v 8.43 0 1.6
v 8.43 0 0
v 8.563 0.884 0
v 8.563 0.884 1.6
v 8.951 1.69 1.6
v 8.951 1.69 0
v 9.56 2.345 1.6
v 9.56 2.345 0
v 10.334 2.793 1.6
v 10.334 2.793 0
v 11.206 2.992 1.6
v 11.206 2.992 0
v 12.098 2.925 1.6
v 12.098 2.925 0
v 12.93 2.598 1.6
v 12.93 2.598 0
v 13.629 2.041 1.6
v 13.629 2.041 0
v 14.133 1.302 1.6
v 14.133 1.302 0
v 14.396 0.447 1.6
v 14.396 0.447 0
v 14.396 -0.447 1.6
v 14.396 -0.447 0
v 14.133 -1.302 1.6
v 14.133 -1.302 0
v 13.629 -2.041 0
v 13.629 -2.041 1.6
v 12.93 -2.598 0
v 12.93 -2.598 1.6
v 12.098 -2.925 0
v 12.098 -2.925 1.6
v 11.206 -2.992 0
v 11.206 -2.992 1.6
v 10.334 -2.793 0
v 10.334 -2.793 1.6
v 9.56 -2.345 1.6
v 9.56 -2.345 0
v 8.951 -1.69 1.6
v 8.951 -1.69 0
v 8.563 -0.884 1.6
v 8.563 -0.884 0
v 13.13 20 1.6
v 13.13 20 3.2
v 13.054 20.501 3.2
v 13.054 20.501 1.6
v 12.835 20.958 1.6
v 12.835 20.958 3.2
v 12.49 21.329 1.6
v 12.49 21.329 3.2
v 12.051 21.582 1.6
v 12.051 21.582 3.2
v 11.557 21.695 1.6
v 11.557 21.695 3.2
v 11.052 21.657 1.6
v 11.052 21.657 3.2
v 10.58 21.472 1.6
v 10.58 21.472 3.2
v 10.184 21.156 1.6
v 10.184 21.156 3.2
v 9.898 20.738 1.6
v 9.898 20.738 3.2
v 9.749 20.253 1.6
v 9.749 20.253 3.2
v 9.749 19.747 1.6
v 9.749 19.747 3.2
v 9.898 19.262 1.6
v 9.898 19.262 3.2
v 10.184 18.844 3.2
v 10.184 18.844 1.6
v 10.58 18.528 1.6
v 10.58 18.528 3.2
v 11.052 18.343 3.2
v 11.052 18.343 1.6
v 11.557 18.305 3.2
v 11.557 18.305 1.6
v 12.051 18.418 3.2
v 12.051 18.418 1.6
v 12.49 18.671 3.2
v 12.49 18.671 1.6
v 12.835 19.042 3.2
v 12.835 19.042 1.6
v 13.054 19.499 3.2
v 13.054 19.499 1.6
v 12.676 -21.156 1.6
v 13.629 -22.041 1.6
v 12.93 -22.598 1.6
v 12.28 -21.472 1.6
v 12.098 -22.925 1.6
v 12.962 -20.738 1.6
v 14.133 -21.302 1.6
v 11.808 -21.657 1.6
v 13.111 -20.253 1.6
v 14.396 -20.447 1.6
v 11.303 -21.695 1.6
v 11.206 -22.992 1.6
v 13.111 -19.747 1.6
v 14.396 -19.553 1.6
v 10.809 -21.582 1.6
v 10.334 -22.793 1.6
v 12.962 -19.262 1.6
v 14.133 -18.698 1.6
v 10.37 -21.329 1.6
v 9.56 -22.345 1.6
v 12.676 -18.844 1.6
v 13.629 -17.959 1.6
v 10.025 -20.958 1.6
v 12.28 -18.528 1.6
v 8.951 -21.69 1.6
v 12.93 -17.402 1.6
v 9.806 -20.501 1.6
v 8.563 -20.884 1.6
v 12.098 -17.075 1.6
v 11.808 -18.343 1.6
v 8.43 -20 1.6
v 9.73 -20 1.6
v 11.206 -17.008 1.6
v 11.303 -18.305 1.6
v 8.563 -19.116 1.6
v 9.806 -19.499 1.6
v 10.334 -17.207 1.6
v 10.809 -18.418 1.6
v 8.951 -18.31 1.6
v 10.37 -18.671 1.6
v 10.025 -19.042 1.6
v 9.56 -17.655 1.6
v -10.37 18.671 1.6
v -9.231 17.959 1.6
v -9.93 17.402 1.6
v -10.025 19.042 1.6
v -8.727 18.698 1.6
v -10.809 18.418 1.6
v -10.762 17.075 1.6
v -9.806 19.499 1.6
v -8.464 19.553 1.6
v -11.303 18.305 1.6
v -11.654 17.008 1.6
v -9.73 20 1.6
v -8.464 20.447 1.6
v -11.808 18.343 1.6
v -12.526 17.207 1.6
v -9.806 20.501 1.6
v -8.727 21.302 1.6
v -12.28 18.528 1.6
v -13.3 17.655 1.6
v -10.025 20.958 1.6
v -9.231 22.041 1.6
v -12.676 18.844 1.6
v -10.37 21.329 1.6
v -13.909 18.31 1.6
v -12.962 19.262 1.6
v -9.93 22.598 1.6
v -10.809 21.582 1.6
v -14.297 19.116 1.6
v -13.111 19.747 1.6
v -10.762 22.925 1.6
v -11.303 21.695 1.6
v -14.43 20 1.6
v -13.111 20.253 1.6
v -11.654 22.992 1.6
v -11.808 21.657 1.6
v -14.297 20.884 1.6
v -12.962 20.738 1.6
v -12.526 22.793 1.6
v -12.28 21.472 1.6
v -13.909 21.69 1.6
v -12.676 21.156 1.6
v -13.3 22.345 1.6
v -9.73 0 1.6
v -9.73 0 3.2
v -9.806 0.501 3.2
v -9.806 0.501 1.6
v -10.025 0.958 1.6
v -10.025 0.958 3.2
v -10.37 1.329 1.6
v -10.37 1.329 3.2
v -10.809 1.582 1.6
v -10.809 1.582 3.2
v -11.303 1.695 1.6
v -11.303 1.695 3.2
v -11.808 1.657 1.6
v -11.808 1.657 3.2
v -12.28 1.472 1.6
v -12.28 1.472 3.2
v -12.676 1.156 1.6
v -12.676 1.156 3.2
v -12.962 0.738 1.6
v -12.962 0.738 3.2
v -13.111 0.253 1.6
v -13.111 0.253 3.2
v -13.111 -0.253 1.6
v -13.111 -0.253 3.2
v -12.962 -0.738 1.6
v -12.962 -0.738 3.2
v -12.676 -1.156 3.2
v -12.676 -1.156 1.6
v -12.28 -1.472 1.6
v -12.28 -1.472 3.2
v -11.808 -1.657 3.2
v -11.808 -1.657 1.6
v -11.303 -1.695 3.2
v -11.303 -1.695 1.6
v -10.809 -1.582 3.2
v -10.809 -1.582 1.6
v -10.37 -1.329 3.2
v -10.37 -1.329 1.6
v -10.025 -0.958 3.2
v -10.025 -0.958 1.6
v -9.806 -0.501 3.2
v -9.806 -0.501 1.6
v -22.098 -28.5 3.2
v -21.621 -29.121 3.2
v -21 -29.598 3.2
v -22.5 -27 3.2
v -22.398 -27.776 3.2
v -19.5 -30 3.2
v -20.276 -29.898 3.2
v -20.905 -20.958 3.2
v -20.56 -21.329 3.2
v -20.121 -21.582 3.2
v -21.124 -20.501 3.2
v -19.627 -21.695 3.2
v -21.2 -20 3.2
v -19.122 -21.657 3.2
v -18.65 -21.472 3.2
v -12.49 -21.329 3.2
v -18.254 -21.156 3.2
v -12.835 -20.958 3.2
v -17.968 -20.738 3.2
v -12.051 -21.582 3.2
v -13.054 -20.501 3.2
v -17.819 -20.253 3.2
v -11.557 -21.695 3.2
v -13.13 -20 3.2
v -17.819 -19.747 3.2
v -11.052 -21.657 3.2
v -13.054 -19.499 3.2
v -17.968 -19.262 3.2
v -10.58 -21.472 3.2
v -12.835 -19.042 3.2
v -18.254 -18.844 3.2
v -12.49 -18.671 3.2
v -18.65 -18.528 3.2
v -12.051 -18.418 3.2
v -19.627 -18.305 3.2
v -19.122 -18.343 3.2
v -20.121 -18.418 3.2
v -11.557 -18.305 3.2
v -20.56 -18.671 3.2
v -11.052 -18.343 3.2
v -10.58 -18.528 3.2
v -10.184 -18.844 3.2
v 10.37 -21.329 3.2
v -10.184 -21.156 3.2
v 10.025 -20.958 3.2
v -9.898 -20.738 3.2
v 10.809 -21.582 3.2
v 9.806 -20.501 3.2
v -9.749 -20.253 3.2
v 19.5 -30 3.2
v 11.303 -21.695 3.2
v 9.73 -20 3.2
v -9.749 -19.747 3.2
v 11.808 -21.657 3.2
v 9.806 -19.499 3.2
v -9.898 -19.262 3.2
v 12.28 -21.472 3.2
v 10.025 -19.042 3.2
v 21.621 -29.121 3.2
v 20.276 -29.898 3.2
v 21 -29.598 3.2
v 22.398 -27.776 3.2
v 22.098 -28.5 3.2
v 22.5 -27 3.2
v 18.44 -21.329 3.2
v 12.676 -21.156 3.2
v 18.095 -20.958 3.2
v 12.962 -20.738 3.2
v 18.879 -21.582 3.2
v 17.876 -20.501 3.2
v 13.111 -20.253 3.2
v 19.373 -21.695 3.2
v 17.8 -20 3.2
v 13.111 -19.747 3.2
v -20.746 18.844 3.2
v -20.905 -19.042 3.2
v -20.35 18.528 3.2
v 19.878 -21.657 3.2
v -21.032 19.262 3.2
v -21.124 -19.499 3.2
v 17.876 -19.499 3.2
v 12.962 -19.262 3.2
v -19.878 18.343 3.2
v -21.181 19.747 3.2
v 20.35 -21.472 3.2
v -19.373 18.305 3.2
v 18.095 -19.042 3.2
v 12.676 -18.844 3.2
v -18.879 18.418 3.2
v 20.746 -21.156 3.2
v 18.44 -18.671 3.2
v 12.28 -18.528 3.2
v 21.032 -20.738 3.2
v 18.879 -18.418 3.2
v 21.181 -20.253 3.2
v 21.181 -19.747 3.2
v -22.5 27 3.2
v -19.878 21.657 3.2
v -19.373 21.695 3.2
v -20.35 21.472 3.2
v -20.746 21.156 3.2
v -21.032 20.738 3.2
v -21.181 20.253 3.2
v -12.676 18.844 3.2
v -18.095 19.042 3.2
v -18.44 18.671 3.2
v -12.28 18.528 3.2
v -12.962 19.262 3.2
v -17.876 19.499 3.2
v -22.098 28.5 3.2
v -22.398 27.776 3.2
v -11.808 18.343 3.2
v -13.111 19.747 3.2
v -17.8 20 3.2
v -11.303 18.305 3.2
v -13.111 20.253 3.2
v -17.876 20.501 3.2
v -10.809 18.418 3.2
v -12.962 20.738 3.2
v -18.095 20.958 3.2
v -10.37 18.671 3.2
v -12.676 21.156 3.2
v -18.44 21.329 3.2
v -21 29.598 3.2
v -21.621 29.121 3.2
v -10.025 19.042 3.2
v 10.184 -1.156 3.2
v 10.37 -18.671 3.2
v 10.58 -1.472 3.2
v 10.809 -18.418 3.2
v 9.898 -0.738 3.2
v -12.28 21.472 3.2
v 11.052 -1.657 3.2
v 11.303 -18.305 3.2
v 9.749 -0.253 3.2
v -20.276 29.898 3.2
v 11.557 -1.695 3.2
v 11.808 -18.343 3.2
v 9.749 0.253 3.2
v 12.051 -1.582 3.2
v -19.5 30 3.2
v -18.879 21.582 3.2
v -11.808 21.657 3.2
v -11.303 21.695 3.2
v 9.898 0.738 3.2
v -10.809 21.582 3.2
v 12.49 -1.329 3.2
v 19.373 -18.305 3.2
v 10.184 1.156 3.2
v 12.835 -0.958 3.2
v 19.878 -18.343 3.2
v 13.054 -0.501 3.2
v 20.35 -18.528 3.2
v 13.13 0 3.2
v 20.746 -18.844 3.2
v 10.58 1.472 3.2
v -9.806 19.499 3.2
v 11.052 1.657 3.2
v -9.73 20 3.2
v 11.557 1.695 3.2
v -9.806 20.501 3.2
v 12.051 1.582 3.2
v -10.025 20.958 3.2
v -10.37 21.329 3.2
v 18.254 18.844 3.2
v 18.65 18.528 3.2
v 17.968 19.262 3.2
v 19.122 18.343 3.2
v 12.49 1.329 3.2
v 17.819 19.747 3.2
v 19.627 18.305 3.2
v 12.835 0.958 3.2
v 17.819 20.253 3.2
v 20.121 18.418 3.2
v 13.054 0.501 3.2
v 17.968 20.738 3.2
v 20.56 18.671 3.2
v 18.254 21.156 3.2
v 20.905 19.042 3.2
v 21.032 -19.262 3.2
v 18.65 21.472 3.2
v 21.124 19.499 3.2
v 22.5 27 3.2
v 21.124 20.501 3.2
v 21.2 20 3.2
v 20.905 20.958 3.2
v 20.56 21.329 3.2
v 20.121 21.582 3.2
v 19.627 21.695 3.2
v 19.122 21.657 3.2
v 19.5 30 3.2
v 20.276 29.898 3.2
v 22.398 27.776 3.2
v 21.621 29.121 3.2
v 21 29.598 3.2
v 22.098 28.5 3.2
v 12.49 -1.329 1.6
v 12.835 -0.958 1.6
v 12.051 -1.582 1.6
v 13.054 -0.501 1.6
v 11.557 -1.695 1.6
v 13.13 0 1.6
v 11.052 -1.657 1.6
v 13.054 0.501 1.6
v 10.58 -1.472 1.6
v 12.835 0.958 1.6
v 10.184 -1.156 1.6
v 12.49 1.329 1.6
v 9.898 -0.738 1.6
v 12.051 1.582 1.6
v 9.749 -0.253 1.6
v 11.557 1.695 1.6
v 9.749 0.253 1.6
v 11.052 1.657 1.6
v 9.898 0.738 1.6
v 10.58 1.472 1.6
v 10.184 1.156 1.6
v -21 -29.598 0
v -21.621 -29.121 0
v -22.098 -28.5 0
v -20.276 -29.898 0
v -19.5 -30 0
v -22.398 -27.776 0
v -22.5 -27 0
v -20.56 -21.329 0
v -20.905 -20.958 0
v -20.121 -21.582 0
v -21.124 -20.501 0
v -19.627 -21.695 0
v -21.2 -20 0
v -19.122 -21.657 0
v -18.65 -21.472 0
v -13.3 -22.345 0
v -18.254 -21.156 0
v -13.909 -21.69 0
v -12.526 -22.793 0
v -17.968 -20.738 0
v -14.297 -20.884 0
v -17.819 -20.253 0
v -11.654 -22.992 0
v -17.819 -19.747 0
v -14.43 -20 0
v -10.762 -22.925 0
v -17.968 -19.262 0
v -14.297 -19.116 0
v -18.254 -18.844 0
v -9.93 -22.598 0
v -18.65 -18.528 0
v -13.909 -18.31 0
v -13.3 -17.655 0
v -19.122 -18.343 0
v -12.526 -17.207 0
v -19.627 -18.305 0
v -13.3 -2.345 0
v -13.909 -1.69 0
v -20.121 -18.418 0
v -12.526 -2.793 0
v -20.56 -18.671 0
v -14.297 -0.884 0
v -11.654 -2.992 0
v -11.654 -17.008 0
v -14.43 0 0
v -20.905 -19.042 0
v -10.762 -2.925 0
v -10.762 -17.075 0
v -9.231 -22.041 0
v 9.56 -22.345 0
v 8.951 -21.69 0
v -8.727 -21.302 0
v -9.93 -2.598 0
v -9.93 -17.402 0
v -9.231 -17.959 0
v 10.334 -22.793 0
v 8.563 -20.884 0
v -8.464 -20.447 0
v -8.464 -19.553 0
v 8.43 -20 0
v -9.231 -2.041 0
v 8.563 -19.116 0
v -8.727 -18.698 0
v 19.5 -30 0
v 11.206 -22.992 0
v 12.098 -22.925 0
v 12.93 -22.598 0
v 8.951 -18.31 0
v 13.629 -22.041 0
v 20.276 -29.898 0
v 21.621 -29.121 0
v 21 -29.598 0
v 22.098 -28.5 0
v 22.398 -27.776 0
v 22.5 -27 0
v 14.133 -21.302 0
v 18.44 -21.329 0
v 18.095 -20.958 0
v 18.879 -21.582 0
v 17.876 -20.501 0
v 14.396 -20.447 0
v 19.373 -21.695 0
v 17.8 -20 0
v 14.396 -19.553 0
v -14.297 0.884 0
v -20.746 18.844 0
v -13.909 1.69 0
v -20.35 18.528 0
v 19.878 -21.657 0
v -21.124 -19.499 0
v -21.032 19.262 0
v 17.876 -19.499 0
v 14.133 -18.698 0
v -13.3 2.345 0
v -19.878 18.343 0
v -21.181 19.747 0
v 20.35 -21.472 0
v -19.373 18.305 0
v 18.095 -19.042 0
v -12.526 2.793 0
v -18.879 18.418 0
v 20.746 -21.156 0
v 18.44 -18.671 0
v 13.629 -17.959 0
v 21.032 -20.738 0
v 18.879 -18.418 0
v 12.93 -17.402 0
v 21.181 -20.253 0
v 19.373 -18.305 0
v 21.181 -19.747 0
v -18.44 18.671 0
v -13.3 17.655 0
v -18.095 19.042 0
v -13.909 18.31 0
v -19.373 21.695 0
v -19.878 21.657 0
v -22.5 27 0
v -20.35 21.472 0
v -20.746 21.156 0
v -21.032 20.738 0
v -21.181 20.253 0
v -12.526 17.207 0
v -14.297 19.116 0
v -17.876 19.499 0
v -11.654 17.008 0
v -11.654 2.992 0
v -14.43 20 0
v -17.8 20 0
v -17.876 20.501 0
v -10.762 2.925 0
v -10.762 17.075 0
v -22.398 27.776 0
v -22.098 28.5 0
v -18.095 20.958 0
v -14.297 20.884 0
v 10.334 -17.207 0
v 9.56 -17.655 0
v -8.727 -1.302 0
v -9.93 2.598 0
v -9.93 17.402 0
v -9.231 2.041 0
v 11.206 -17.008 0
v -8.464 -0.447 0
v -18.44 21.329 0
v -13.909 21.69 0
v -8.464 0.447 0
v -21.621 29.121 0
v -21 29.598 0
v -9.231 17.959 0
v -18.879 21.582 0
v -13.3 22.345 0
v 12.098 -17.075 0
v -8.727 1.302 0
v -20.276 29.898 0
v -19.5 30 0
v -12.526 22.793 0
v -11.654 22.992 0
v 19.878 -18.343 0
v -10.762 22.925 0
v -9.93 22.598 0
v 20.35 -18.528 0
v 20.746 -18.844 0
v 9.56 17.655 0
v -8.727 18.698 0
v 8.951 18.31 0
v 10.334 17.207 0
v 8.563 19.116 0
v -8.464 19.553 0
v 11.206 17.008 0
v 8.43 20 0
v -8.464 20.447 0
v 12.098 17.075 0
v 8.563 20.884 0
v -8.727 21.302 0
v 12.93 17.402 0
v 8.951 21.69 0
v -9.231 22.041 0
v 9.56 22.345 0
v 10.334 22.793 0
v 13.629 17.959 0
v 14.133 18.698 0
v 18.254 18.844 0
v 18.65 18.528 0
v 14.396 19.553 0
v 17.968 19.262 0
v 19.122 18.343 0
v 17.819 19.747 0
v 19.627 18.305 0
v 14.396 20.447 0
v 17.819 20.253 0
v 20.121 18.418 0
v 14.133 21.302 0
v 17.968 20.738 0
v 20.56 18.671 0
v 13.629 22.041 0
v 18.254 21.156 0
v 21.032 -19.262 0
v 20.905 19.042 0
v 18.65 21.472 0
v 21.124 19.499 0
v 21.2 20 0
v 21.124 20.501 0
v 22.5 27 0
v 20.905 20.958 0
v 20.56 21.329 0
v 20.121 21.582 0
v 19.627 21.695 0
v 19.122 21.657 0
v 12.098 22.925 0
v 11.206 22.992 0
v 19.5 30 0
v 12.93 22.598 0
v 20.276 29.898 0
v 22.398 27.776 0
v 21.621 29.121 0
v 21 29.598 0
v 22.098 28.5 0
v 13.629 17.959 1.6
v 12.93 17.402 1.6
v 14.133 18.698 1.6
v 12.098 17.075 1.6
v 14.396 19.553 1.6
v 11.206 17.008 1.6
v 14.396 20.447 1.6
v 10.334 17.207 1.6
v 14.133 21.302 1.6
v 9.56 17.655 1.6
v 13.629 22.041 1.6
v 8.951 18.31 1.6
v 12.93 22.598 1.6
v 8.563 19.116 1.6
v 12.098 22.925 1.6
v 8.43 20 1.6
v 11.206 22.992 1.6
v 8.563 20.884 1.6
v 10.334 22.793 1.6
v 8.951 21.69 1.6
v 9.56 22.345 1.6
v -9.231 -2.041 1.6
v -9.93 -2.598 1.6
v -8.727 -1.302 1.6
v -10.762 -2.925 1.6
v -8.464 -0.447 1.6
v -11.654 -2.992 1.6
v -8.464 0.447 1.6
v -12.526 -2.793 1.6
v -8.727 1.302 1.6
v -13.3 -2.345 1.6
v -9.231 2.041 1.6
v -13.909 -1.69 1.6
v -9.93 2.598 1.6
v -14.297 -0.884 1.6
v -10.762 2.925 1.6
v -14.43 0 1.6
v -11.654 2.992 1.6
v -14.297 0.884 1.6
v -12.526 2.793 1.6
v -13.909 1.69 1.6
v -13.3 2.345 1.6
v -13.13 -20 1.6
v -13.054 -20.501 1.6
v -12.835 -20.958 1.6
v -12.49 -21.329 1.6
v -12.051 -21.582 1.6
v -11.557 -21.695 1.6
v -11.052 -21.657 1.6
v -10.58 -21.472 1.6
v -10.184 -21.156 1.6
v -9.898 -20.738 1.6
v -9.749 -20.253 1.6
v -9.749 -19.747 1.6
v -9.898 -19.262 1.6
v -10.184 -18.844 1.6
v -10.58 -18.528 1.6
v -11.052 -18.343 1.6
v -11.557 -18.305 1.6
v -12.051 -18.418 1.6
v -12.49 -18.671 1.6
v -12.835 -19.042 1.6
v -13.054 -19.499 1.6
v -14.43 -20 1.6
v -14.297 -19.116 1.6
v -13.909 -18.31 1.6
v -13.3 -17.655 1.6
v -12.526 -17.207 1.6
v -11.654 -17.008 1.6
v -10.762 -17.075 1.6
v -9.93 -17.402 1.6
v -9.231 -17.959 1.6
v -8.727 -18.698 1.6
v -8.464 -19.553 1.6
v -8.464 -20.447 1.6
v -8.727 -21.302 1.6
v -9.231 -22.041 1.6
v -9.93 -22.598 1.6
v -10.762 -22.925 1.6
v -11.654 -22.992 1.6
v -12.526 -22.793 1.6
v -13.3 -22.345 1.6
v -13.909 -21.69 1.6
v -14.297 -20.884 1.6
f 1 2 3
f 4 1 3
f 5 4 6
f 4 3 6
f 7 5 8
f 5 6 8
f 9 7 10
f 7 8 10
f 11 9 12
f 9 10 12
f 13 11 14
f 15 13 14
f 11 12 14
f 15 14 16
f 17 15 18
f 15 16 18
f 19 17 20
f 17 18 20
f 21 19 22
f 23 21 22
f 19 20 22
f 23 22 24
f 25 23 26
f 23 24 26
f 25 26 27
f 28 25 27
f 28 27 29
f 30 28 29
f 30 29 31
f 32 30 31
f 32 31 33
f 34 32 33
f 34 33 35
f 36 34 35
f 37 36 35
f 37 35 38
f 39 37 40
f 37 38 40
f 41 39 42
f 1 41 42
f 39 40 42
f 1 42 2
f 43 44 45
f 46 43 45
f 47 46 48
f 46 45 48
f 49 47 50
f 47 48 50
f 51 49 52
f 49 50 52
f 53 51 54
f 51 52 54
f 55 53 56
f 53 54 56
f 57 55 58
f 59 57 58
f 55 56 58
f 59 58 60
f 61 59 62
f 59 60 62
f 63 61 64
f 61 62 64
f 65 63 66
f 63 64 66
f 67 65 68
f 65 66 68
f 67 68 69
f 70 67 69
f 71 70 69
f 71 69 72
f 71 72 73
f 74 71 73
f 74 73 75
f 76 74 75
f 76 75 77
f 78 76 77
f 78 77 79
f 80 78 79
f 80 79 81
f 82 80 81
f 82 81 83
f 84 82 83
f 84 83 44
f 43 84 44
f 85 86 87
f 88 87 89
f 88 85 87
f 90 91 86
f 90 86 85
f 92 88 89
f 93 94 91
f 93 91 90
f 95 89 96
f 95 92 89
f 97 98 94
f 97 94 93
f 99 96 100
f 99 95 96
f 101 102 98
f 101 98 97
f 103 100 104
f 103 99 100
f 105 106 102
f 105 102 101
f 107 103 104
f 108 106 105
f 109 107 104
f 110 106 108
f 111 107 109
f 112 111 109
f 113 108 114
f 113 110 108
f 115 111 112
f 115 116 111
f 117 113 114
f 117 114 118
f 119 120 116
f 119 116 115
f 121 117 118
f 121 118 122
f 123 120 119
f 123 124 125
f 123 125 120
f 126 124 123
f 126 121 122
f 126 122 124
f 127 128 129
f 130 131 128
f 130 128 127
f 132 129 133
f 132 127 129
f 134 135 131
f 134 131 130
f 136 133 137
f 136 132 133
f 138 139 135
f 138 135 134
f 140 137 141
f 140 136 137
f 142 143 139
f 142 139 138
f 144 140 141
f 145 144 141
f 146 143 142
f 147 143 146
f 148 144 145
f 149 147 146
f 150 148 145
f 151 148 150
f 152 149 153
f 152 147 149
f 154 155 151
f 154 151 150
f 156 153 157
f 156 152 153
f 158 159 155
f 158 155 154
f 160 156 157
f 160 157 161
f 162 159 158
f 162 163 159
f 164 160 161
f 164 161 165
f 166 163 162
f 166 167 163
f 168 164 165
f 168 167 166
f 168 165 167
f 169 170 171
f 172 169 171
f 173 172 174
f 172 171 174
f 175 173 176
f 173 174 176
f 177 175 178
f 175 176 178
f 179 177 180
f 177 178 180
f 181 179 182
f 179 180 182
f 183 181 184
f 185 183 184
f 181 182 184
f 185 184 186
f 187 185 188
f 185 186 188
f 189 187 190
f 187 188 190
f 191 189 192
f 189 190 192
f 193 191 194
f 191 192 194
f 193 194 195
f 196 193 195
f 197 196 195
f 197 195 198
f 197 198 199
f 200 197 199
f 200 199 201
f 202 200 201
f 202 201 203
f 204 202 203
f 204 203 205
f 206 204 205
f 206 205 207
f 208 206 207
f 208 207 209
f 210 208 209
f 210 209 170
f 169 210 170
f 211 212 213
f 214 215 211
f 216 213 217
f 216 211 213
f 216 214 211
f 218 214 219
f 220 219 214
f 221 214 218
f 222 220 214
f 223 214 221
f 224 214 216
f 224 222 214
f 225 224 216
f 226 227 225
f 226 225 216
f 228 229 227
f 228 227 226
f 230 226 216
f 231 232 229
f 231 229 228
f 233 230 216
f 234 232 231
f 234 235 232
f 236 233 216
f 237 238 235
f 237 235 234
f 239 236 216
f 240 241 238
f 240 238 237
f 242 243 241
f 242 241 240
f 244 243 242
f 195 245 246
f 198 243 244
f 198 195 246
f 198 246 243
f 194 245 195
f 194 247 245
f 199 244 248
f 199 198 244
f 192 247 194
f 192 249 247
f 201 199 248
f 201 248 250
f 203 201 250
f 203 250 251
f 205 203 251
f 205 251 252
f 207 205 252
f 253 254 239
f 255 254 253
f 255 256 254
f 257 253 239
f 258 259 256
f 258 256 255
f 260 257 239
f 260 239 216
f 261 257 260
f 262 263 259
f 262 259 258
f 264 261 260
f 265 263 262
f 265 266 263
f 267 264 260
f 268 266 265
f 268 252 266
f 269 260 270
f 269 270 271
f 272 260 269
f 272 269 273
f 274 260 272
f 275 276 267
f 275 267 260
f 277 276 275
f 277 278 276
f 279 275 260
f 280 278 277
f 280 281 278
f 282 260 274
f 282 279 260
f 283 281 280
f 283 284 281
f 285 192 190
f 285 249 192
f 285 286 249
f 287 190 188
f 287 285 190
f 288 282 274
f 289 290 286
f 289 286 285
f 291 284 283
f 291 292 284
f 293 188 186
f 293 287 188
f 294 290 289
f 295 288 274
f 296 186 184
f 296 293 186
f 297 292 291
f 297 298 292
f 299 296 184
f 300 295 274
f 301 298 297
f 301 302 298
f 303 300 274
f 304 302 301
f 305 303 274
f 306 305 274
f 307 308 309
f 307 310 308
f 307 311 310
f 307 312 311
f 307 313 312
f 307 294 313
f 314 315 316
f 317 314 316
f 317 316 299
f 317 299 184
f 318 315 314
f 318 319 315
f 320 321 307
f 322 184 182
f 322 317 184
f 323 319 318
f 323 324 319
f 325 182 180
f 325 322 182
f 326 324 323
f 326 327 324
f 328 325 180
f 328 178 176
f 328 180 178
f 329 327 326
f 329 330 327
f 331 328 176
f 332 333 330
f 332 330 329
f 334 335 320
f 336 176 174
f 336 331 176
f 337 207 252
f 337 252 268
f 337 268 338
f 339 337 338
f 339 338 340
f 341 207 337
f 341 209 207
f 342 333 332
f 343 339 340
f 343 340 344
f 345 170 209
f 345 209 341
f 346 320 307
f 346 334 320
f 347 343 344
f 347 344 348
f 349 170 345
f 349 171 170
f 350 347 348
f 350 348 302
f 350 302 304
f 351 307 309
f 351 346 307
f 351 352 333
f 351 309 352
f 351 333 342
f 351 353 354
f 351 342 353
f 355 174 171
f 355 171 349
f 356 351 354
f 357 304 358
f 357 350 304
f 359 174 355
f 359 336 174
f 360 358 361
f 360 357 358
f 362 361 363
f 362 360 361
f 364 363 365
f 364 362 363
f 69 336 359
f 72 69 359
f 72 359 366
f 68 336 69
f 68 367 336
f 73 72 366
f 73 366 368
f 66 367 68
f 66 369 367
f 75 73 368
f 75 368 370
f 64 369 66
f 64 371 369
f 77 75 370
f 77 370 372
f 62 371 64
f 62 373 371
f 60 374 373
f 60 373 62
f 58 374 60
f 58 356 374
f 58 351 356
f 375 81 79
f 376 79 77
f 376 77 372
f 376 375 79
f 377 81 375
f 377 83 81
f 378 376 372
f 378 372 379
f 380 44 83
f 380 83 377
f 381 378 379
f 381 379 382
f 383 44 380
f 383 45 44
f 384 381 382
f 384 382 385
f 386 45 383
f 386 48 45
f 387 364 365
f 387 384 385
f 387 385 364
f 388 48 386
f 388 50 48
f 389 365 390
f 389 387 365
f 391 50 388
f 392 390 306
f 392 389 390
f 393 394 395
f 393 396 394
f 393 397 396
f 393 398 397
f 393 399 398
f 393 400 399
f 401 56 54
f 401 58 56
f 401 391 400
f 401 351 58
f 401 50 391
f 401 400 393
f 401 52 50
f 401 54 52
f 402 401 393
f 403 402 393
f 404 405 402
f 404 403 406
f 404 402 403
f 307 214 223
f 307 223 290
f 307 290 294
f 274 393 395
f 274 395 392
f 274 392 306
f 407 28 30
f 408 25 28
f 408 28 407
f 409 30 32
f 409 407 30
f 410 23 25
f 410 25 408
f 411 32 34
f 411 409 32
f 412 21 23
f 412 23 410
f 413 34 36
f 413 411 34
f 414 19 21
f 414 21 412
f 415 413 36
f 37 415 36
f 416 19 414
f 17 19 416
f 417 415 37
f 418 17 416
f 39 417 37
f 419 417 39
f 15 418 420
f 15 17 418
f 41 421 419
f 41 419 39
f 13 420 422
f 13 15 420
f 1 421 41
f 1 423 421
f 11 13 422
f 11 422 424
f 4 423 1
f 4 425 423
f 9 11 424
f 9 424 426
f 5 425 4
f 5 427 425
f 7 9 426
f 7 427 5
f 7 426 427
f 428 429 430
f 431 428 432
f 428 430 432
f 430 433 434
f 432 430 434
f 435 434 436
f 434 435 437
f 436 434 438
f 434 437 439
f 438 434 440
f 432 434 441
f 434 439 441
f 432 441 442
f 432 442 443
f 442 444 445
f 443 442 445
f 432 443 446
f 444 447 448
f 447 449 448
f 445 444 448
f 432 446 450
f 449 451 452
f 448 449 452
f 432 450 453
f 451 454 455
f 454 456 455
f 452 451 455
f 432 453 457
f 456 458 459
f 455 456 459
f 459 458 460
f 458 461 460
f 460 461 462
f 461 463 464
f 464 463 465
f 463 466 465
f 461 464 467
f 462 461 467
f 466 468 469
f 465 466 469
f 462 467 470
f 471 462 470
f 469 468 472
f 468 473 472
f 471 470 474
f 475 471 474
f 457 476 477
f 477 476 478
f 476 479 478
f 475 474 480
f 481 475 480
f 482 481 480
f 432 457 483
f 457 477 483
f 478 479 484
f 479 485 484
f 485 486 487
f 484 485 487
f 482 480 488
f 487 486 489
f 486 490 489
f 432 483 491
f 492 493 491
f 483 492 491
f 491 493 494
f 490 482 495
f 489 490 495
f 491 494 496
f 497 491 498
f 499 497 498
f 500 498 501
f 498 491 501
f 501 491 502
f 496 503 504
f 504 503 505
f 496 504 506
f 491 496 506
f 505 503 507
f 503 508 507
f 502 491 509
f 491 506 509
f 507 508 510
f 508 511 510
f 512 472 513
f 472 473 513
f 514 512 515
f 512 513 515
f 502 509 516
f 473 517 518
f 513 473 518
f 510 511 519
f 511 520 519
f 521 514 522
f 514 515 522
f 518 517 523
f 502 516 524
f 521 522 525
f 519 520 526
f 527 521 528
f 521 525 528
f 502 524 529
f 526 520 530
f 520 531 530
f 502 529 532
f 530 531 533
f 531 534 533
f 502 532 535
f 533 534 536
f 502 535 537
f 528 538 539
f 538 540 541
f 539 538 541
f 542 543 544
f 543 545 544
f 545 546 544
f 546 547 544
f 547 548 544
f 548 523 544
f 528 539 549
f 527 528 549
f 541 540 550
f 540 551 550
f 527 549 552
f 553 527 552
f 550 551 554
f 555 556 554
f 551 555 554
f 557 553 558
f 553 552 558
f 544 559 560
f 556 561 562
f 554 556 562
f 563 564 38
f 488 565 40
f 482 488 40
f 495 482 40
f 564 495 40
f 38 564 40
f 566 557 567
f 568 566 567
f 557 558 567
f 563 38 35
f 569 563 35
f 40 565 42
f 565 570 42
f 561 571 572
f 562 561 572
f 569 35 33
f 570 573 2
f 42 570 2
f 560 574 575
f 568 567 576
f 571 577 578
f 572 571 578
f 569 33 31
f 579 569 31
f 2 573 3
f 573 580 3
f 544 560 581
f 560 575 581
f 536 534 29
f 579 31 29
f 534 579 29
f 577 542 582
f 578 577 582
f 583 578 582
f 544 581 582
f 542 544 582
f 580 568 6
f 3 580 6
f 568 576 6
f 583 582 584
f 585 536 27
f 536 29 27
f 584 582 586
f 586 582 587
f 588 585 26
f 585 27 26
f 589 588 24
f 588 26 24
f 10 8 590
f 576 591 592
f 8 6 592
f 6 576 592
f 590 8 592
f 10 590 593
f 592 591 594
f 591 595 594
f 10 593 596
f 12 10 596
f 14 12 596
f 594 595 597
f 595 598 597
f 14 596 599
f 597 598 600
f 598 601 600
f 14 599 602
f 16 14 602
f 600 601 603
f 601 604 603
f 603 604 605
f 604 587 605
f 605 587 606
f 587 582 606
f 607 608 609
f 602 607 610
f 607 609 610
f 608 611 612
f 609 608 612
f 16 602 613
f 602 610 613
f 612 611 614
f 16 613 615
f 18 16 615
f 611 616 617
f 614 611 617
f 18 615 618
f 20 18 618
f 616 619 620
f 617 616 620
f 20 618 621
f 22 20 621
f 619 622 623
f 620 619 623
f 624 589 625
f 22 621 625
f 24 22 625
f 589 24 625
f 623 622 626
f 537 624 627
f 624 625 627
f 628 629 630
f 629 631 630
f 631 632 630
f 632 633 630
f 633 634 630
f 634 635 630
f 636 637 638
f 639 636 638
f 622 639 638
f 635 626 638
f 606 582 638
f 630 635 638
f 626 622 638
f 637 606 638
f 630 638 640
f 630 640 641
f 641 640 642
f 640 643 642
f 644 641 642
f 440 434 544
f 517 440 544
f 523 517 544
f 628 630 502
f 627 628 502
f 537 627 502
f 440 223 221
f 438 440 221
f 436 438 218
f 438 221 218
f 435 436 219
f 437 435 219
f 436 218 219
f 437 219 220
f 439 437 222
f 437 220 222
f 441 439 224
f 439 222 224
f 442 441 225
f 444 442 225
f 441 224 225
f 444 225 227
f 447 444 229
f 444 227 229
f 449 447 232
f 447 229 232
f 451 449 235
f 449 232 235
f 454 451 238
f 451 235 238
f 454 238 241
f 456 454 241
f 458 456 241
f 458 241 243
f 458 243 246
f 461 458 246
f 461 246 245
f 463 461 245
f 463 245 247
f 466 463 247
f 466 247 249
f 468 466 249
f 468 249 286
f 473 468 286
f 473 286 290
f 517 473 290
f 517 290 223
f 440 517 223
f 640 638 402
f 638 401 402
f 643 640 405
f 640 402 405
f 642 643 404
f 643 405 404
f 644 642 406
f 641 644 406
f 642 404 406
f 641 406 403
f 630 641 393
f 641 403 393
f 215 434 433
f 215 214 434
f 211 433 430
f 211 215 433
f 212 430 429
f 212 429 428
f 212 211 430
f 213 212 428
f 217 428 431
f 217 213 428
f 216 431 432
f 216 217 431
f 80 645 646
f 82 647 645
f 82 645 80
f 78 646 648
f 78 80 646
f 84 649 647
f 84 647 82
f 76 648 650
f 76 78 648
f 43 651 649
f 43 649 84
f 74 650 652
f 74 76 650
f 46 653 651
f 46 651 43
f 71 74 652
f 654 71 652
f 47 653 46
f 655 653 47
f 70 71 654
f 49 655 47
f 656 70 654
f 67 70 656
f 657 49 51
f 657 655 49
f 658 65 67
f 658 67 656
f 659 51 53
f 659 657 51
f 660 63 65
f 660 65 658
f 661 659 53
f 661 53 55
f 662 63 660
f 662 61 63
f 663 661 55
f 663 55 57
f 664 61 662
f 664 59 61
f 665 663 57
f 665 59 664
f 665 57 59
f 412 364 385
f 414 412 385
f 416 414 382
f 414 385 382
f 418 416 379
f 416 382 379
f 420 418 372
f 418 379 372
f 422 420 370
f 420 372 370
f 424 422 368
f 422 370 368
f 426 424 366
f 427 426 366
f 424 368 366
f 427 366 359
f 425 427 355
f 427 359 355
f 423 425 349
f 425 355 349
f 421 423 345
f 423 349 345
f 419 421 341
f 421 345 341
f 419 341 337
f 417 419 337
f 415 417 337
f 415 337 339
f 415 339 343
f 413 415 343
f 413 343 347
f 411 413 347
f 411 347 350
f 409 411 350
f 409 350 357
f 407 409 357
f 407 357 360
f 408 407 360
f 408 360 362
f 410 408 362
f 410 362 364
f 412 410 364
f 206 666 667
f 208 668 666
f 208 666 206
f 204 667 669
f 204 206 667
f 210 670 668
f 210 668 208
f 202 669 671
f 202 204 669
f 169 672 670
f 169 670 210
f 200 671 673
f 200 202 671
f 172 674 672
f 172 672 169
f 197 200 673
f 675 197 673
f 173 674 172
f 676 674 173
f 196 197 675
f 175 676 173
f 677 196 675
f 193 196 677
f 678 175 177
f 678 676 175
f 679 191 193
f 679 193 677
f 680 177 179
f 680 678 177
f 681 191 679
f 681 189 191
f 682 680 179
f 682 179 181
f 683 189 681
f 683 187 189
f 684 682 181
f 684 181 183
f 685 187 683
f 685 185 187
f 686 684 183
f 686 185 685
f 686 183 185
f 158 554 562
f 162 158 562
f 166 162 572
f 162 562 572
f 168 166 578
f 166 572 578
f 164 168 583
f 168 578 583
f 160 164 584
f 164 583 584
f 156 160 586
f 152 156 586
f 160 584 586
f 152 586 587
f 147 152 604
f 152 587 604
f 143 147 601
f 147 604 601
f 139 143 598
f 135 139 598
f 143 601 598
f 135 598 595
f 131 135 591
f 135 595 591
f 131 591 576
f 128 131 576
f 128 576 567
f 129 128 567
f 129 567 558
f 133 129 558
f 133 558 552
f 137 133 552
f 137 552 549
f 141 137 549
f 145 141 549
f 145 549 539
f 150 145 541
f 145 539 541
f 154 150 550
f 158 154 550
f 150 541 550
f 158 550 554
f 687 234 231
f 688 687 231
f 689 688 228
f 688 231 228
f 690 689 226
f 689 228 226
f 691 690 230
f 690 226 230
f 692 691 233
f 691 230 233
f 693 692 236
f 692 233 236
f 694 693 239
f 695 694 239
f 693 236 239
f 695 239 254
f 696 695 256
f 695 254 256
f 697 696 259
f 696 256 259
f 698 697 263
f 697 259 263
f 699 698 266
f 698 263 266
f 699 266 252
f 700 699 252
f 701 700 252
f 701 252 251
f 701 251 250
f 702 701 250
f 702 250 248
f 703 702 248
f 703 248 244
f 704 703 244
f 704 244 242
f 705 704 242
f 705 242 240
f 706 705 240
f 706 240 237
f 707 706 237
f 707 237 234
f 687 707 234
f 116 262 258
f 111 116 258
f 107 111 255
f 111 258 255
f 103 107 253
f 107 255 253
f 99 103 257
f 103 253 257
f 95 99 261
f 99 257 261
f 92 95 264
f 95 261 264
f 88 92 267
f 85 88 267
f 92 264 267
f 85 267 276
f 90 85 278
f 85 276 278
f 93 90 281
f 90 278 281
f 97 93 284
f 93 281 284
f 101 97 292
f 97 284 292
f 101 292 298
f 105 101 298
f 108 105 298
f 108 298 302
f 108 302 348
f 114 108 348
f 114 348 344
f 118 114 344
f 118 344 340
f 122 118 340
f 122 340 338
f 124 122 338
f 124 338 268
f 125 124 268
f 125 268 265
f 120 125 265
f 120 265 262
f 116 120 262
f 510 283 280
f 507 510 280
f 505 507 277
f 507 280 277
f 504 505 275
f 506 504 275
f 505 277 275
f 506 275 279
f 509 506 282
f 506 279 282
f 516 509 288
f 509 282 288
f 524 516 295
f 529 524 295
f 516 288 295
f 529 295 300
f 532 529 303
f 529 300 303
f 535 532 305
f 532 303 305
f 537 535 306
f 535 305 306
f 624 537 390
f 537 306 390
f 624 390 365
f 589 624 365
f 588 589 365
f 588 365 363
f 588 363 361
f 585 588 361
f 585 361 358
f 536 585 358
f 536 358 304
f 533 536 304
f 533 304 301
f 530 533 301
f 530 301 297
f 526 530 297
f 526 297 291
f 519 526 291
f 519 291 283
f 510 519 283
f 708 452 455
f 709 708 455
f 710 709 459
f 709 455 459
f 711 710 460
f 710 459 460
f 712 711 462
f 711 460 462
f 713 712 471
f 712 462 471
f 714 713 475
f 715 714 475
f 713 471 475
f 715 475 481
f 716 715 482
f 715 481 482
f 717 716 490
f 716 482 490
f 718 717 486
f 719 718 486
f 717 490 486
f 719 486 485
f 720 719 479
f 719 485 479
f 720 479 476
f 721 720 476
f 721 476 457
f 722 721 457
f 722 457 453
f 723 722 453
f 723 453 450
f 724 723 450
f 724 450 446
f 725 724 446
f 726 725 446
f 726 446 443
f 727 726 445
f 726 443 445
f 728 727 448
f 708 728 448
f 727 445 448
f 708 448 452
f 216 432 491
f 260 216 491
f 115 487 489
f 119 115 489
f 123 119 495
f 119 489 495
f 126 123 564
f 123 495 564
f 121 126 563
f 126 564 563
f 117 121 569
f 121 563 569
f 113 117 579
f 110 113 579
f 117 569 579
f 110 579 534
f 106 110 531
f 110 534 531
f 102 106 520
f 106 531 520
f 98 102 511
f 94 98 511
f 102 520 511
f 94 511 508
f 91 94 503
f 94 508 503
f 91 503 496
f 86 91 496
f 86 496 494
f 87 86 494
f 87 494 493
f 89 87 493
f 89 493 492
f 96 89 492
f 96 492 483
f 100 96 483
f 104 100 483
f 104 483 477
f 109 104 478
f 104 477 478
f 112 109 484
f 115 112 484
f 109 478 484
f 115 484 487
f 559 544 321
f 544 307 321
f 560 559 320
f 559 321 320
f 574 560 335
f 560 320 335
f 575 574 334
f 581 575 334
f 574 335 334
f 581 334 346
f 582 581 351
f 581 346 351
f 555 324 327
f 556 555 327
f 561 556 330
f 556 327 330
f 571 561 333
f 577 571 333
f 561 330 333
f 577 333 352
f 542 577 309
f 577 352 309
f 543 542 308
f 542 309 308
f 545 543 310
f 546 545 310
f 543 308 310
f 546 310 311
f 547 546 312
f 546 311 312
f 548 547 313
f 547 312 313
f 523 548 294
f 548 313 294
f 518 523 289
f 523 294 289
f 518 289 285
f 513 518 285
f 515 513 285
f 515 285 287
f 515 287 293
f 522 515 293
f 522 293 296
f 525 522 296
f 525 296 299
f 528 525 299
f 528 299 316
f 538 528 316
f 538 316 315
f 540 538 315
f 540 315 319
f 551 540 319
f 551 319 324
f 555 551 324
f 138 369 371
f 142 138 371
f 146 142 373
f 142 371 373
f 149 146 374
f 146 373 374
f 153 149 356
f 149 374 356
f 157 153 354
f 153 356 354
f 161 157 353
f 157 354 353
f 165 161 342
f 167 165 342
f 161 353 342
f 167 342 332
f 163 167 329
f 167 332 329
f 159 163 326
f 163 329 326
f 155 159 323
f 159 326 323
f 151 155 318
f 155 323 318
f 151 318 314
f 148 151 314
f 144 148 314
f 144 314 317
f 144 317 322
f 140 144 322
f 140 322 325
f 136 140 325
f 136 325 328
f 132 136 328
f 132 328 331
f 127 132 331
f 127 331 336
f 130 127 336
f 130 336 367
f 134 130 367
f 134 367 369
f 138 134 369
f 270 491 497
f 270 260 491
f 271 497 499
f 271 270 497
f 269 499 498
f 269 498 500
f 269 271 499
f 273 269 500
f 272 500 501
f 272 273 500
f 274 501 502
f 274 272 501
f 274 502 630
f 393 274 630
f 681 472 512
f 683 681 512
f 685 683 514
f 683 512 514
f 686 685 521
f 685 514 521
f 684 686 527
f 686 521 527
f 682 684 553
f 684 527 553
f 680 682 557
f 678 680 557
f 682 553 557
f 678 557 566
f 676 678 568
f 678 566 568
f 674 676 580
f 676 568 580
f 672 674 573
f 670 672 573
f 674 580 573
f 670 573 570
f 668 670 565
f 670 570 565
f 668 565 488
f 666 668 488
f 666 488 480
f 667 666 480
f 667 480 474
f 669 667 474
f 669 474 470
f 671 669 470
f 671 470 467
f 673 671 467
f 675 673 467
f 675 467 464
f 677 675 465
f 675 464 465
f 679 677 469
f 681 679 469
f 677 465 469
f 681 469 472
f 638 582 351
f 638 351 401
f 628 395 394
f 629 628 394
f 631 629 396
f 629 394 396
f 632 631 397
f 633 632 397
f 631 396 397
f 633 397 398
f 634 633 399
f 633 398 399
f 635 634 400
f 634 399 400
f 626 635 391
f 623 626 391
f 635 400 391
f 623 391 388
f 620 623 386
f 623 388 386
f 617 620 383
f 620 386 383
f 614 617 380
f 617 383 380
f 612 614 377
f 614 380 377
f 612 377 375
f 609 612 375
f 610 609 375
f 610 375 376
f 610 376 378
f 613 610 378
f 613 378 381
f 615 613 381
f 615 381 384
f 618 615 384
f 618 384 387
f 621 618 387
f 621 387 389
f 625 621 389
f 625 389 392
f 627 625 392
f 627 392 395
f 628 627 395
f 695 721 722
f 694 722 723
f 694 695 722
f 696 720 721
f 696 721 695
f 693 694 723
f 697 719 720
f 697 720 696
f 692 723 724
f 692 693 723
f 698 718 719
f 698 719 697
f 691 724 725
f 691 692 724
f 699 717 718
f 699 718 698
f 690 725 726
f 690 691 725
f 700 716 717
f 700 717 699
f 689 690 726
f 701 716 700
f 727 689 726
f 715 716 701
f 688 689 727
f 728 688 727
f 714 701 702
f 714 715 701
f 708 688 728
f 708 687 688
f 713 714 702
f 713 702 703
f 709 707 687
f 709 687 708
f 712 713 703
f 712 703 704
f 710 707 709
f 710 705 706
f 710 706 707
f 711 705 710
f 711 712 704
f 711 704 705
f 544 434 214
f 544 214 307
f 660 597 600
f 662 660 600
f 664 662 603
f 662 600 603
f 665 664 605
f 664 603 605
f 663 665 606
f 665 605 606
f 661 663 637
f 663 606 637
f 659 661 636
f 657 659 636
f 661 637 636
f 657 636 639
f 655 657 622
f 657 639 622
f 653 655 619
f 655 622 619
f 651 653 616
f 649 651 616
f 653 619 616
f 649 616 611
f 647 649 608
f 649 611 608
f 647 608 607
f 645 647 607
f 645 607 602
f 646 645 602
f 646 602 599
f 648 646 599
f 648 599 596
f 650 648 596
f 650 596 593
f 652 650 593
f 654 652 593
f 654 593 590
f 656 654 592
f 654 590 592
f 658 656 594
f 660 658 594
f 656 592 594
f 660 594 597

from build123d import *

# Parameters (mm, degrees)
SKETCH_1_W          = 45
SKETCH_1_H          = 60
EXTRUDE_1_DEPTH     = 3.2
SKETCH_3_R          = 1.7
CUT_EXTRUDE_2_DEPTH = 38.636285683
SKETCH_2_R          = 1.7
CUT_EXTRUDE_1_DEPTH = 38.636285683
FILLET_1_R          = 3
SKETCH_4_R          = 3
CUT_EXTRUDE_3_DEPTH = 1.6


with BuildPart() as part:
    # 草圖1 → 填料-伸長1 (new body)
    with BuildSketch(Plane.XY):
        Rectangle(SKETCH_1_W, SKETCH_1_H)
    extrude(amount=EXTRUDE_1_DEPTH)

    # 草圖3 → 除料-伸長2 (cut, through all)
    with BuildSketch(Plane.XY.offset(3.2)):
        with Locations((-11.43, 0)):
            Circle(SKETCH_3_R)
        with Locations((11.43, 0)):
            Circle(SKETCH_3_R)
        with Locations((11.43, 20)):
            Circle(SKETCH_3_R)
        with Locations((-11.43, 20)):
            Circle(SKETCH_3_R)
        with Locations(Location((-11.43, -20, 0), (0, 0, 180))):
            Circle(SKETCH_3_R)
        with Locations(Location((11.43, -20, 0), (0, 0, 180))):
            Circle(SKETCH_3_R)
    extrude(amount=-CUT_EXTRUDE_2_DEPTH, mode=Mode.SUBTRACT)

    # 草圖2 → 除料-伸長1 (cut, through all)
    with BuildSketch(Plane.XY.offset(3.2)):
        with Locations((-19.5, 20)):
            Circle(SKETCH_2_R)
        with Locations((19.5, 20)):
            Circle(SKETCH_2_R)
        with Locations(Location((19.5, -20, 0), (0, 0, 180))):
            Circle(SKETCH_2_R)
        with Locations(Location((-19.5, -20, 0), (0, 0, 180))):
            Circle(SKETCH_2_R)
    extrude(amount=-CUT_EXTRUDE_1_DEPTH, mode=Mode.SUBTRACT)

    # 圓角1
    fillet_1_edges = [part.edges().sort_by_distance(p)[0] for p in [
        (-22.5, 30, 1.6),
        (22.5, 30, 1.6),
        (22.5, -30, 1.6),
        (-22.5, -30, 1.6),
    ]]
    fillet(fillet_1_edges, radius=FILLET_1_R)

    # 草圖4 → 除料-伸長3 (cut)
    with BuildSketch(Plane(origin=(0, 0, 0), x_dir=(-1, 0, 0), z_dir=(0, 0, -1))):
        with Locations((-11.43, 20)):
            Circle(SKETCH_4_R)
        with Locations((11.43, 20)):
            Circle(SKETCH_4_R)
        with Locations((-11.43, 0)):
            Circle(SKETCH_4_R)
        with Locations((11.43, 0)):
            Circle(SKETCH_4_R)
        with Locations((-11.43, -20)):
            Circle(SKETCH_4_R)
        with Locations((11.43, -20)):
            Circle(SKETCH_4_R)
    extrude(amount=-CUT_EXTRUDE_3_DEPTH, mode=Mode.SUBTRACT)


solid = part.part
